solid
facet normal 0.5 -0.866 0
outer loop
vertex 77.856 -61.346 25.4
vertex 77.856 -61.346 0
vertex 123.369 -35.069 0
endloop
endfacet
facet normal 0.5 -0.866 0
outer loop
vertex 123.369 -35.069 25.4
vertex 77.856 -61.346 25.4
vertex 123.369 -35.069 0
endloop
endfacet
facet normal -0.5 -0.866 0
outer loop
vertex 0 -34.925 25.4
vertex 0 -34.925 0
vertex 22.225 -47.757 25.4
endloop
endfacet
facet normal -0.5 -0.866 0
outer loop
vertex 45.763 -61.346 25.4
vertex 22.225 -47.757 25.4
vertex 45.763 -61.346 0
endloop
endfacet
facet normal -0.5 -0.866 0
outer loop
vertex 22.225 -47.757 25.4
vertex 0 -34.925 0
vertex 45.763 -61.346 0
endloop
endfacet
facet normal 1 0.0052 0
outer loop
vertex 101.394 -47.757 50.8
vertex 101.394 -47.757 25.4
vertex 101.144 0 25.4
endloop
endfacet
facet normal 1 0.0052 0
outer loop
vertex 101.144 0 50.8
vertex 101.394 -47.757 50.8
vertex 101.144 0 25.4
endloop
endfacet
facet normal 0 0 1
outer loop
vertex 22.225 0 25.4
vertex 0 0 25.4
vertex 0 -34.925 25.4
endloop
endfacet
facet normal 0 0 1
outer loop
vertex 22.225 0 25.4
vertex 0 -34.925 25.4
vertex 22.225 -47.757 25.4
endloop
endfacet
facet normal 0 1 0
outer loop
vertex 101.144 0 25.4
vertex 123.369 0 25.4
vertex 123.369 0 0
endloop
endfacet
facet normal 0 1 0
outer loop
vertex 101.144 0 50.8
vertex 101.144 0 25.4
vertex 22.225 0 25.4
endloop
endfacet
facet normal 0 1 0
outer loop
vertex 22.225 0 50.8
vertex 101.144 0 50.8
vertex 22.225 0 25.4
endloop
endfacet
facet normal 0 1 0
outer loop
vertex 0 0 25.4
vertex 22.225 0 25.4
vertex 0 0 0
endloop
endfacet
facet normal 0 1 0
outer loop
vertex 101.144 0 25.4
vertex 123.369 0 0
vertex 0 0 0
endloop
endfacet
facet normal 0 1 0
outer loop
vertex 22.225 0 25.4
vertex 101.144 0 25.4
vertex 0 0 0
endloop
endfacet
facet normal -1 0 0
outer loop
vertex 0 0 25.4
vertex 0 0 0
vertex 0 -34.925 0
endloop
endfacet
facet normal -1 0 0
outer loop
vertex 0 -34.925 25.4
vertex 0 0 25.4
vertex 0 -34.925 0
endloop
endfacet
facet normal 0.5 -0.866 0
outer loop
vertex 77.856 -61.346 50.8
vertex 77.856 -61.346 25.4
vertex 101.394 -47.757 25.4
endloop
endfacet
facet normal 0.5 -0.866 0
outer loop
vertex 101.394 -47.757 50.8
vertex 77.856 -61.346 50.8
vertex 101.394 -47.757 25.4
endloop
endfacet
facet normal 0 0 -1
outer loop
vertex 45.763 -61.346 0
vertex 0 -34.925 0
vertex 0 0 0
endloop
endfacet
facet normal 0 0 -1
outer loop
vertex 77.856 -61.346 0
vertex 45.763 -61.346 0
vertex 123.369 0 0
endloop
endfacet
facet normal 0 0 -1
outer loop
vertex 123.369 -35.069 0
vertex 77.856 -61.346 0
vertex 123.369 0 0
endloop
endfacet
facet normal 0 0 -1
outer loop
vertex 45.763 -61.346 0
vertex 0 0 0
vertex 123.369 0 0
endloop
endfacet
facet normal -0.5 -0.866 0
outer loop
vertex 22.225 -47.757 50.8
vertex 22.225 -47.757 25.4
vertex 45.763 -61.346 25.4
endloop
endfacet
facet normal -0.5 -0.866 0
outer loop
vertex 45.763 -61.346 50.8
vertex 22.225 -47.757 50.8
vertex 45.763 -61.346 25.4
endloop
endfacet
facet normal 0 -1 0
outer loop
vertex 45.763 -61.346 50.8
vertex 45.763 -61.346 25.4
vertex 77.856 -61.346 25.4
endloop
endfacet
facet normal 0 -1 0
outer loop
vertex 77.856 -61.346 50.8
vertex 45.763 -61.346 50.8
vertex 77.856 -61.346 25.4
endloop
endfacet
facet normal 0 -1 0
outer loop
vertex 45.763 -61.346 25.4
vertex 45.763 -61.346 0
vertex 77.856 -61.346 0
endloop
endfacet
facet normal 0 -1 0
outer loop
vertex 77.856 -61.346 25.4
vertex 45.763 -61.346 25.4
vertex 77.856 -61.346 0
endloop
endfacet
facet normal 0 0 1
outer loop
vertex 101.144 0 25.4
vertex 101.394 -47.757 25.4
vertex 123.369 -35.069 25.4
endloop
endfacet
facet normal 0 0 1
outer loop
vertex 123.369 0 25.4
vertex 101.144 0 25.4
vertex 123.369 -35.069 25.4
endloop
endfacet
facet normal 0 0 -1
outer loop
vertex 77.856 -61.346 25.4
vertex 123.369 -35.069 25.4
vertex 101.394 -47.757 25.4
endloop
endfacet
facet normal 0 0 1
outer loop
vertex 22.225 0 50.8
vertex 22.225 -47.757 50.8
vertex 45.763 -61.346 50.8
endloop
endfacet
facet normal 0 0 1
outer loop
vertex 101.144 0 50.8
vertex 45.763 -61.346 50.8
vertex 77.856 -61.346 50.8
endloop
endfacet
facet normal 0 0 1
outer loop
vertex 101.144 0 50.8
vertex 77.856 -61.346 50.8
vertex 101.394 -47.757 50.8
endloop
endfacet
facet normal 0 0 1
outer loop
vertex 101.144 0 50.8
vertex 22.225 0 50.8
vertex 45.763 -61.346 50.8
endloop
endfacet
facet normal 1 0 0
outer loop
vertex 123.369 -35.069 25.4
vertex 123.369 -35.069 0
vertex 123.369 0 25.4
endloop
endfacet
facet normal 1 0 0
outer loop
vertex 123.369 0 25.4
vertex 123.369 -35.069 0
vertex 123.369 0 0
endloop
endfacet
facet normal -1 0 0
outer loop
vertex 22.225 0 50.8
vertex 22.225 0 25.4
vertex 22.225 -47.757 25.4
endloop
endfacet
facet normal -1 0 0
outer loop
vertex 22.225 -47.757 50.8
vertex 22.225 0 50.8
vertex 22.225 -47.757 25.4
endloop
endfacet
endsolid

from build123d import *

# Parameters (mm, degrees)
F1_DEPTH = 25.4
F3_DEPTH = 25.4


with BuildPart() as f1:
    # F0 (on Top) → F1 (new body)
    with BuildSketch(Plane.XY):
        Polygon((22.881487, 0), (0, 0), (0, -34.925), (45.762975, -61.346266), (77.856142, -61.346266), (123.369409, -35.069169), (123.369409, 0), (100.435721, 0), (76.2, 0), (45.762975, 0), align=None)
    extrude(amount=F1_DEPTH)

    # F2 (on face) → F3 (join)
    with BuildSketch(Plane.XY.offset(25.4)):
        Polygon((101.144409, 0), (22.225, 0), (22.225, -47.75661), (45.762975, -61.346266), (77.856142, -61.346266), (101.394116, -47.75661), align=None)
    extrude(amount=F3_DEPTH)


solid = f1.part
